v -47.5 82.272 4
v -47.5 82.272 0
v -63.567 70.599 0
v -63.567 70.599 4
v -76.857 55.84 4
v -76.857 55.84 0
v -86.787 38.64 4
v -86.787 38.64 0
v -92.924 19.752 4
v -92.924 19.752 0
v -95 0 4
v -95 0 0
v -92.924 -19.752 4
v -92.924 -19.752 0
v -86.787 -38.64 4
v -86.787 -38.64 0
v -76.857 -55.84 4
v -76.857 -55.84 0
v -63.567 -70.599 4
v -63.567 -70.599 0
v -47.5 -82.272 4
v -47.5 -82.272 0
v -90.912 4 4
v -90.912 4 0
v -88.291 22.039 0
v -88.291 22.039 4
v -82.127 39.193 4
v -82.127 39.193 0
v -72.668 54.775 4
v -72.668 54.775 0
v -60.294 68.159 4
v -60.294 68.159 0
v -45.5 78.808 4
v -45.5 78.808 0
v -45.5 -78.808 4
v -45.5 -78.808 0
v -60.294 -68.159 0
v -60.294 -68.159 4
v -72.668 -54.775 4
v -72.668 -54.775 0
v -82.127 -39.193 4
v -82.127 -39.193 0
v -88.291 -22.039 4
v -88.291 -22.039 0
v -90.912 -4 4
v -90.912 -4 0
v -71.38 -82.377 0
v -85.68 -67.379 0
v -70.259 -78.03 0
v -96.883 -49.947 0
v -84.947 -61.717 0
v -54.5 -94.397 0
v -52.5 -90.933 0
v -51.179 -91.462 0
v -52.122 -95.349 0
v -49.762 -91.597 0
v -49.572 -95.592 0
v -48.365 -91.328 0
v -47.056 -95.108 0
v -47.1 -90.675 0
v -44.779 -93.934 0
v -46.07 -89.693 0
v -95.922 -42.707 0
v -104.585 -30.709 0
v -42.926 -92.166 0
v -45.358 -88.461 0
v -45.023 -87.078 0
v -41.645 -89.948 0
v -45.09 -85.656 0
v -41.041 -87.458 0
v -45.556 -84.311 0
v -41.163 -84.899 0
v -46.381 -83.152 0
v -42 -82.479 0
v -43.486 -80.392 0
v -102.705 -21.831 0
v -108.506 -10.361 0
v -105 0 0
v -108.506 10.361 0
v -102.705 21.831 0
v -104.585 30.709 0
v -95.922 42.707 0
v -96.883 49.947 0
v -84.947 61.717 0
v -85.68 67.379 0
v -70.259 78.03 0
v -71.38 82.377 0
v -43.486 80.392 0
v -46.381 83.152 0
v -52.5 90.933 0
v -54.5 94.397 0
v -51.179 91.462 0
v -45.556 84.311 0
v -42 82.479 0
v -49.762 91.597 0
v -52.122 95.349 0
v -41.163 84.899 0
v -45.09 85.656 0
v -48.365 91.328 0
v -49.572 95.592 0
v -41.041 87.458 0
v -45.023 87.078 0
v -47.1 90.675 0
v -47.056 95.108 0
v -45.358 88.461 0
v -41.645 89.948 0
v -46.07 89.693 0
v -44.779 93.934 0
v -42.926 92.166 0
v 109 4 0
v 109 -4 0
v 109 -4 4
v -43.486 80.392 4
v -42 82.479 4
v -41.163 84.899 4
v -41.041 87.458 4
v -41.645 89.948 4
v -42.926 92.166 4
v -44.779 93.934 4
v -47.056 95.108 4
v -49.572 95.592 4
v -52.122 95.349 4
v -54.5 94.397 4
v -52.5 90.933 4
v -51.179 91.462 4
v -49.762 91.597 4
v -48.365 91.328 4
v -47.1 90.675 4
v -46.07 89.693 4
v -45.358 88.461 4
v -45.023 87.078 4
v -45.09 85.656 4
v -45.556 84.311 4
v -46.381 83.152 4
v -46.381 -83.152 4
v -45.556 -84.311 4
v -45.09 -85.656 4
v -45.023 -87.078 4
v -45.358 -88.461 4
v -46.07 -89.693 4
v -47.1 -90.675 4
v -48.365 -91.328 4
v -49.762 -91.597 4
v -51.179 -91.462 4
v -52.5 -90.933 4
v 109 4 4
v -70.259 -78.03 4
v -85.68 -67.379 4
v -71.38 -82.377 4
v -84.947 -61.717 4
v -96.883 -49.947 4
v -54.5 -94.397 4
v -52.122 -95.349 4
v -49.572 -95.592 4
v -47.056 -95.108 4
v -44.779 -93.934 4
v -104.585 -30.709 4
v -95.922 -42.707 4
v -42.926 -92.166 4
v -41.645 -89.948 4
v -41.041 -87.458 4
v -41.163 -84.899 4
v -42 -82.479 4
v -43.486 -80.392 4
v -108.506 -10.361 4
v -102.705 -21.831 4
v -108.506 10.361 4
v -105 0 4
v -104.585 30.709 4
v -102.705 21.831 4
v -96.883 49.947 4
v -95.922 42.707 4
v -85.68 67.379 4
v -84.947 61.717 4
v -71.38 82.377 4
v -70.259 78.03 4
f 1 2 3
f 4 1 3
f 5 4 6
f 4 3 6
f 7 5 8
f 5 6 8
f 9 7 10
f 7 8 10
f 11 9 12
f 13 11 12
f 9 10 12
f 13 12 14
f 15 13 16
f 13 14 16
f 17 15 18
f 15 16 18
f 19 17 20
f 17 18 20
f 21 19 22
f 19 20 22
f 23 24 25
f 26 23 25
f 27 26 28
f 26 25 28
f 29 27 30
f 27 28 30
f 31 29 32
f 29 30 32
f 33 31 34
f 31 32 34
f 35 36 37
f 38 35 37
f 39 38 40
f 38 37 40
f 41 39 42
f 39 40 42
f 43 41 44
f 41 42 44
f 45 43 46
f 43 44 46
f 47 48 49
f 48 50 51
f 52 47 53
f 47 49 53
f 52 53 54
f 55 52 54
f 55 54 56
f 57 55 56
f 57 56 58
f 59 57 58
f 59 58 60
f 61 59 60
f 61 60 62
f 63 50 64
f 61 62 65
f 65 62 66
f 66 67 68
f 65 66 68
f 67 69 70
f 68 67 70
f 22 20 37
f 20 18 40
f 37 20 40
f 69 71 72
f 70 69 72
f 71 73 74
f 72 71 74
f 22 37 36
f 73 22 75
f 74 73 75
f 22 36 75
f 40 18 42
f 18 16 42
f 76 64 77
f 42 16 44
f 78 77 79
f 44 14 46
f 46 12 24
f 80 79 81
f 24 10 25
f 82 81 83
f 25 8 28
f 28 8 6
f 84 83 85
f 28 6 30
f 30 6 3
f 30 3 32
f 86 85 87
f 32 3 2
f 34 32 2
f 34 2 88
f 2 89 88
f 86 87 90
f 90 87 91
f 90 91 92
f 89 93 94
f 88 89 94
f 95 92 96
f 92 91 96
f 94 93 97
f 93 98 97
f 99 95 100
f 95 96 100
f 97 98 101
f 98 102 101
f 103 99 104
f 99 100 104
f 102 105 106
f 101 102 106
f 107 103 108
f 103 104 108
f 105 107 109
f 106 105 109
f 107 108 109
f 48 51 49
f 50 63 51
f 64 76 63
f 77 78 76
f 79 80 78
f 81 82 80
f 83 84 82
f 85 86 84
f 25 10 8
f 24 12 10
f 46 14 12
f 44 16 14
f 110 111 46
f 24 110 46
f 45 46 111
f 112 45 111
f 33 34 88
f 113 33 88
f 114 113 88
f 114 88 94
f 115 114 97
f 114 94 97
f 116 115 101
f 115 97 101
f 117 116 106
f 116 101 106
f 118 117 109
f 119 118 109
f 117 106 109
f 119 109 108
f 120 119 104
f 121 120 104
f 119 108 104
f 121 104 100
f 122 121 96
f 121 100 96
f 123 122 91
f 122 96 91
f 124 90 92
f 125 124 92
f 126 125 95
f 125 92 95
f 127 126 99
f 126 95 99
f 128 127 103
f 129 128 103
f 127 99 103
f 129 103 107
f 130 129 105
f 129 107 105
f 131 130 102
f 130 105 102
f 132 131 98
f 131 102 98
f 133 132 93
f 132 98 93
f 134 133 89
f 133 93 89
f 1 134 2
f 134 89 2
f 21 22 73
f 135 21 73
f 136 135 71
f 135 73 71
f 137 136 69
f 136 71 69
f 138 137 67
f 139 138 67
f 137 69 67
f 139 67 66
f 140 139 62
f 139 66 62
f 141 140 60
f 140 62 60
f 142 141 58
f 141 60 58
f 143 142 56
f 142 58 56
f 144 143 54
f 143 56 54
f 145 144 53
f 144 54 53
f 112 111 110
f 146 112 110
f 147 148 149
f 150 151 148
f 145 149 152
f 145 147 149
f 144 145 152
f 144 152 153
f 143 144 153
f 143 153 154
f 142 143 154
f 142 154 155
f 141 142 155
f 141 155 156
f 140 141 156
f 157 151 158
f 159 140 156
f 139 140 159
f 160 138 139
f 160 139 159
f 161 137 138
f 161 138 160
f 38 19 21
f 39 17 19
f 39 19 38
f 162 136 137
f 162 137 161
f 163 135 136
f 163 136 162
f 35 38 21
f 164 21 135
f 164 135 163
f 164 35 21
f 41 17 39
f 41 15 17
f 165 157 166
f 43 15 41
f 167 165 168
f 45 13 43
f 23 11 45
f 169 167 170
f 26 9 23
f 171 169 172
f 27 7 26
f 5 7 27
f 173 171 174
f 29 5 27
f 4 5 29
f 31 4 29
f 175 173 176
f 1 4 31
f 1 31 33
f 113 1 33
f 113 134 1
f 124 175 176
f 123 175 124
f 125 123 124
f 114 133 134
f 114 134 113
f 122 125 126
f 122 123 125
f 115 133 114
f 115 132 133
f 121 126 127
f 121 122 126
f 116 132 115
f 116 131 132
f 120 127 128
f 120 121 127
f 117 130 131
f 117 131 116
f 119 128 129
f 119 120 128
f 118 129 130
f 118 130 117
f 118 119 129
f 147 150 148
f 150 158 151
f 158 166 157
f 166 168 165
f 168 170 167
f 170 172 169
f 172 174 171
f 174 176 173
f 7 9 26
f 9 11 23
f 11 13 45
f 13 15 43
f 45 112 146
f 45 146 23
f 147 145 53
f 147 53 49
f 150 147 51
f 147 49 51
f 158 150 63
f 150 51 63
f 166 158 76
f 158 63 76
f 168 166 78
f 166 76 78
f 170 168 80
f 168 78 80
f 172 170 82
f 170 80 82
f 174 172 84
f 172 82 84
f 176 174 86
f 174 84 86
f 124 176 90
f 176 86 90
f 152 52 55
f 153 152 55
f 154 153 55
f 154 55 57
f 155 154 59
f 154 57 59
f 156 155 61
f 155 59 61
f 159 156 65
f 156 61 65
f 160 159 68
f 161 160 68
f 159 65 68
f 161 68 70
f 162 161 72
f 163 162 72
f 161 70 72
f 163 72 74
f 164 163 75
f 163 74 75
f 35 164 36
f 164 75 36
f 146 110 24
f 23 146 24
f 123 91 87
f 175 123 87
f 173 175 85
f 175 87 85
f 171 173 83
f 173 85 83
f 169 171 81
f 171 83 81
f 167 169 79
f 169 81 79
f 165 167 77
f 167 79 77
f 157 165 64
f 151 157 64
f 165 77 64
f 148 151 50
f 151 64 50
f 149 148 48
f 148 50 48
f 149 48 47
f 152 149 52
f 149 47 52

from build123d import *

# Parameters (mm, degrees)
EXTRUDE_1_DEPTH = 4


with BuildPart() as part:
    # 草图1 → 凸台-拉伸1 (new body)
    with BuildSketch(Plane.XY):
        with BuildLine():
            Line((-90.912045407, -4), (0, -4))
            Line((0, -4), (109, -4))
            Line((109, -4), (109, 4))
            Line((109, 4), (0, 4))
            Line((0, 4), (-90.912045407, 4))
            ThreePointArc((-90.912045407, 4), (-77.789024994, 47.221473828), (-45.5, 78.808311744))
            ThreePointArc((-45.5, 78.808311744), (-42.205771366, 91.102540378), (-54.5, 94.396769013))
            ThreePointArc((-54.5, 94.396769013), (-109, 0), (-54.5, -94.396769013))
            ThreePointArc((-54.5, -94.396769013), (-42.205771366, -91.102540378), (-45.5, -78.808311744))
            ThreePointArc((-45.5, -78.808311744), (-77.789024994, -47.221473828), (-90.912045407, -4))
        make_face()
        with BuildLine():
            ThreePointArc((-52.5, -90.932667397), (-105, 0), (-52.5, 90.932667397))
            ThreePointArc((-52.5, 90.932667397), (-45.669872981, 89.102540378), (-47.5, 82.27241336))
            ThreePointArc((-47.5, 82.27241336), (-95, 0), (-47.5, -82.27241336))
            ThreePointArc((-47.5, -82.27241336), (-45.669872981, -89.102540378), (-52.5, -90.932667397))
        make_face(mode=Mode.SUBTRACT)
    extrude(amount=EXTRUDE_1_DEPTH)


solid = part.part
